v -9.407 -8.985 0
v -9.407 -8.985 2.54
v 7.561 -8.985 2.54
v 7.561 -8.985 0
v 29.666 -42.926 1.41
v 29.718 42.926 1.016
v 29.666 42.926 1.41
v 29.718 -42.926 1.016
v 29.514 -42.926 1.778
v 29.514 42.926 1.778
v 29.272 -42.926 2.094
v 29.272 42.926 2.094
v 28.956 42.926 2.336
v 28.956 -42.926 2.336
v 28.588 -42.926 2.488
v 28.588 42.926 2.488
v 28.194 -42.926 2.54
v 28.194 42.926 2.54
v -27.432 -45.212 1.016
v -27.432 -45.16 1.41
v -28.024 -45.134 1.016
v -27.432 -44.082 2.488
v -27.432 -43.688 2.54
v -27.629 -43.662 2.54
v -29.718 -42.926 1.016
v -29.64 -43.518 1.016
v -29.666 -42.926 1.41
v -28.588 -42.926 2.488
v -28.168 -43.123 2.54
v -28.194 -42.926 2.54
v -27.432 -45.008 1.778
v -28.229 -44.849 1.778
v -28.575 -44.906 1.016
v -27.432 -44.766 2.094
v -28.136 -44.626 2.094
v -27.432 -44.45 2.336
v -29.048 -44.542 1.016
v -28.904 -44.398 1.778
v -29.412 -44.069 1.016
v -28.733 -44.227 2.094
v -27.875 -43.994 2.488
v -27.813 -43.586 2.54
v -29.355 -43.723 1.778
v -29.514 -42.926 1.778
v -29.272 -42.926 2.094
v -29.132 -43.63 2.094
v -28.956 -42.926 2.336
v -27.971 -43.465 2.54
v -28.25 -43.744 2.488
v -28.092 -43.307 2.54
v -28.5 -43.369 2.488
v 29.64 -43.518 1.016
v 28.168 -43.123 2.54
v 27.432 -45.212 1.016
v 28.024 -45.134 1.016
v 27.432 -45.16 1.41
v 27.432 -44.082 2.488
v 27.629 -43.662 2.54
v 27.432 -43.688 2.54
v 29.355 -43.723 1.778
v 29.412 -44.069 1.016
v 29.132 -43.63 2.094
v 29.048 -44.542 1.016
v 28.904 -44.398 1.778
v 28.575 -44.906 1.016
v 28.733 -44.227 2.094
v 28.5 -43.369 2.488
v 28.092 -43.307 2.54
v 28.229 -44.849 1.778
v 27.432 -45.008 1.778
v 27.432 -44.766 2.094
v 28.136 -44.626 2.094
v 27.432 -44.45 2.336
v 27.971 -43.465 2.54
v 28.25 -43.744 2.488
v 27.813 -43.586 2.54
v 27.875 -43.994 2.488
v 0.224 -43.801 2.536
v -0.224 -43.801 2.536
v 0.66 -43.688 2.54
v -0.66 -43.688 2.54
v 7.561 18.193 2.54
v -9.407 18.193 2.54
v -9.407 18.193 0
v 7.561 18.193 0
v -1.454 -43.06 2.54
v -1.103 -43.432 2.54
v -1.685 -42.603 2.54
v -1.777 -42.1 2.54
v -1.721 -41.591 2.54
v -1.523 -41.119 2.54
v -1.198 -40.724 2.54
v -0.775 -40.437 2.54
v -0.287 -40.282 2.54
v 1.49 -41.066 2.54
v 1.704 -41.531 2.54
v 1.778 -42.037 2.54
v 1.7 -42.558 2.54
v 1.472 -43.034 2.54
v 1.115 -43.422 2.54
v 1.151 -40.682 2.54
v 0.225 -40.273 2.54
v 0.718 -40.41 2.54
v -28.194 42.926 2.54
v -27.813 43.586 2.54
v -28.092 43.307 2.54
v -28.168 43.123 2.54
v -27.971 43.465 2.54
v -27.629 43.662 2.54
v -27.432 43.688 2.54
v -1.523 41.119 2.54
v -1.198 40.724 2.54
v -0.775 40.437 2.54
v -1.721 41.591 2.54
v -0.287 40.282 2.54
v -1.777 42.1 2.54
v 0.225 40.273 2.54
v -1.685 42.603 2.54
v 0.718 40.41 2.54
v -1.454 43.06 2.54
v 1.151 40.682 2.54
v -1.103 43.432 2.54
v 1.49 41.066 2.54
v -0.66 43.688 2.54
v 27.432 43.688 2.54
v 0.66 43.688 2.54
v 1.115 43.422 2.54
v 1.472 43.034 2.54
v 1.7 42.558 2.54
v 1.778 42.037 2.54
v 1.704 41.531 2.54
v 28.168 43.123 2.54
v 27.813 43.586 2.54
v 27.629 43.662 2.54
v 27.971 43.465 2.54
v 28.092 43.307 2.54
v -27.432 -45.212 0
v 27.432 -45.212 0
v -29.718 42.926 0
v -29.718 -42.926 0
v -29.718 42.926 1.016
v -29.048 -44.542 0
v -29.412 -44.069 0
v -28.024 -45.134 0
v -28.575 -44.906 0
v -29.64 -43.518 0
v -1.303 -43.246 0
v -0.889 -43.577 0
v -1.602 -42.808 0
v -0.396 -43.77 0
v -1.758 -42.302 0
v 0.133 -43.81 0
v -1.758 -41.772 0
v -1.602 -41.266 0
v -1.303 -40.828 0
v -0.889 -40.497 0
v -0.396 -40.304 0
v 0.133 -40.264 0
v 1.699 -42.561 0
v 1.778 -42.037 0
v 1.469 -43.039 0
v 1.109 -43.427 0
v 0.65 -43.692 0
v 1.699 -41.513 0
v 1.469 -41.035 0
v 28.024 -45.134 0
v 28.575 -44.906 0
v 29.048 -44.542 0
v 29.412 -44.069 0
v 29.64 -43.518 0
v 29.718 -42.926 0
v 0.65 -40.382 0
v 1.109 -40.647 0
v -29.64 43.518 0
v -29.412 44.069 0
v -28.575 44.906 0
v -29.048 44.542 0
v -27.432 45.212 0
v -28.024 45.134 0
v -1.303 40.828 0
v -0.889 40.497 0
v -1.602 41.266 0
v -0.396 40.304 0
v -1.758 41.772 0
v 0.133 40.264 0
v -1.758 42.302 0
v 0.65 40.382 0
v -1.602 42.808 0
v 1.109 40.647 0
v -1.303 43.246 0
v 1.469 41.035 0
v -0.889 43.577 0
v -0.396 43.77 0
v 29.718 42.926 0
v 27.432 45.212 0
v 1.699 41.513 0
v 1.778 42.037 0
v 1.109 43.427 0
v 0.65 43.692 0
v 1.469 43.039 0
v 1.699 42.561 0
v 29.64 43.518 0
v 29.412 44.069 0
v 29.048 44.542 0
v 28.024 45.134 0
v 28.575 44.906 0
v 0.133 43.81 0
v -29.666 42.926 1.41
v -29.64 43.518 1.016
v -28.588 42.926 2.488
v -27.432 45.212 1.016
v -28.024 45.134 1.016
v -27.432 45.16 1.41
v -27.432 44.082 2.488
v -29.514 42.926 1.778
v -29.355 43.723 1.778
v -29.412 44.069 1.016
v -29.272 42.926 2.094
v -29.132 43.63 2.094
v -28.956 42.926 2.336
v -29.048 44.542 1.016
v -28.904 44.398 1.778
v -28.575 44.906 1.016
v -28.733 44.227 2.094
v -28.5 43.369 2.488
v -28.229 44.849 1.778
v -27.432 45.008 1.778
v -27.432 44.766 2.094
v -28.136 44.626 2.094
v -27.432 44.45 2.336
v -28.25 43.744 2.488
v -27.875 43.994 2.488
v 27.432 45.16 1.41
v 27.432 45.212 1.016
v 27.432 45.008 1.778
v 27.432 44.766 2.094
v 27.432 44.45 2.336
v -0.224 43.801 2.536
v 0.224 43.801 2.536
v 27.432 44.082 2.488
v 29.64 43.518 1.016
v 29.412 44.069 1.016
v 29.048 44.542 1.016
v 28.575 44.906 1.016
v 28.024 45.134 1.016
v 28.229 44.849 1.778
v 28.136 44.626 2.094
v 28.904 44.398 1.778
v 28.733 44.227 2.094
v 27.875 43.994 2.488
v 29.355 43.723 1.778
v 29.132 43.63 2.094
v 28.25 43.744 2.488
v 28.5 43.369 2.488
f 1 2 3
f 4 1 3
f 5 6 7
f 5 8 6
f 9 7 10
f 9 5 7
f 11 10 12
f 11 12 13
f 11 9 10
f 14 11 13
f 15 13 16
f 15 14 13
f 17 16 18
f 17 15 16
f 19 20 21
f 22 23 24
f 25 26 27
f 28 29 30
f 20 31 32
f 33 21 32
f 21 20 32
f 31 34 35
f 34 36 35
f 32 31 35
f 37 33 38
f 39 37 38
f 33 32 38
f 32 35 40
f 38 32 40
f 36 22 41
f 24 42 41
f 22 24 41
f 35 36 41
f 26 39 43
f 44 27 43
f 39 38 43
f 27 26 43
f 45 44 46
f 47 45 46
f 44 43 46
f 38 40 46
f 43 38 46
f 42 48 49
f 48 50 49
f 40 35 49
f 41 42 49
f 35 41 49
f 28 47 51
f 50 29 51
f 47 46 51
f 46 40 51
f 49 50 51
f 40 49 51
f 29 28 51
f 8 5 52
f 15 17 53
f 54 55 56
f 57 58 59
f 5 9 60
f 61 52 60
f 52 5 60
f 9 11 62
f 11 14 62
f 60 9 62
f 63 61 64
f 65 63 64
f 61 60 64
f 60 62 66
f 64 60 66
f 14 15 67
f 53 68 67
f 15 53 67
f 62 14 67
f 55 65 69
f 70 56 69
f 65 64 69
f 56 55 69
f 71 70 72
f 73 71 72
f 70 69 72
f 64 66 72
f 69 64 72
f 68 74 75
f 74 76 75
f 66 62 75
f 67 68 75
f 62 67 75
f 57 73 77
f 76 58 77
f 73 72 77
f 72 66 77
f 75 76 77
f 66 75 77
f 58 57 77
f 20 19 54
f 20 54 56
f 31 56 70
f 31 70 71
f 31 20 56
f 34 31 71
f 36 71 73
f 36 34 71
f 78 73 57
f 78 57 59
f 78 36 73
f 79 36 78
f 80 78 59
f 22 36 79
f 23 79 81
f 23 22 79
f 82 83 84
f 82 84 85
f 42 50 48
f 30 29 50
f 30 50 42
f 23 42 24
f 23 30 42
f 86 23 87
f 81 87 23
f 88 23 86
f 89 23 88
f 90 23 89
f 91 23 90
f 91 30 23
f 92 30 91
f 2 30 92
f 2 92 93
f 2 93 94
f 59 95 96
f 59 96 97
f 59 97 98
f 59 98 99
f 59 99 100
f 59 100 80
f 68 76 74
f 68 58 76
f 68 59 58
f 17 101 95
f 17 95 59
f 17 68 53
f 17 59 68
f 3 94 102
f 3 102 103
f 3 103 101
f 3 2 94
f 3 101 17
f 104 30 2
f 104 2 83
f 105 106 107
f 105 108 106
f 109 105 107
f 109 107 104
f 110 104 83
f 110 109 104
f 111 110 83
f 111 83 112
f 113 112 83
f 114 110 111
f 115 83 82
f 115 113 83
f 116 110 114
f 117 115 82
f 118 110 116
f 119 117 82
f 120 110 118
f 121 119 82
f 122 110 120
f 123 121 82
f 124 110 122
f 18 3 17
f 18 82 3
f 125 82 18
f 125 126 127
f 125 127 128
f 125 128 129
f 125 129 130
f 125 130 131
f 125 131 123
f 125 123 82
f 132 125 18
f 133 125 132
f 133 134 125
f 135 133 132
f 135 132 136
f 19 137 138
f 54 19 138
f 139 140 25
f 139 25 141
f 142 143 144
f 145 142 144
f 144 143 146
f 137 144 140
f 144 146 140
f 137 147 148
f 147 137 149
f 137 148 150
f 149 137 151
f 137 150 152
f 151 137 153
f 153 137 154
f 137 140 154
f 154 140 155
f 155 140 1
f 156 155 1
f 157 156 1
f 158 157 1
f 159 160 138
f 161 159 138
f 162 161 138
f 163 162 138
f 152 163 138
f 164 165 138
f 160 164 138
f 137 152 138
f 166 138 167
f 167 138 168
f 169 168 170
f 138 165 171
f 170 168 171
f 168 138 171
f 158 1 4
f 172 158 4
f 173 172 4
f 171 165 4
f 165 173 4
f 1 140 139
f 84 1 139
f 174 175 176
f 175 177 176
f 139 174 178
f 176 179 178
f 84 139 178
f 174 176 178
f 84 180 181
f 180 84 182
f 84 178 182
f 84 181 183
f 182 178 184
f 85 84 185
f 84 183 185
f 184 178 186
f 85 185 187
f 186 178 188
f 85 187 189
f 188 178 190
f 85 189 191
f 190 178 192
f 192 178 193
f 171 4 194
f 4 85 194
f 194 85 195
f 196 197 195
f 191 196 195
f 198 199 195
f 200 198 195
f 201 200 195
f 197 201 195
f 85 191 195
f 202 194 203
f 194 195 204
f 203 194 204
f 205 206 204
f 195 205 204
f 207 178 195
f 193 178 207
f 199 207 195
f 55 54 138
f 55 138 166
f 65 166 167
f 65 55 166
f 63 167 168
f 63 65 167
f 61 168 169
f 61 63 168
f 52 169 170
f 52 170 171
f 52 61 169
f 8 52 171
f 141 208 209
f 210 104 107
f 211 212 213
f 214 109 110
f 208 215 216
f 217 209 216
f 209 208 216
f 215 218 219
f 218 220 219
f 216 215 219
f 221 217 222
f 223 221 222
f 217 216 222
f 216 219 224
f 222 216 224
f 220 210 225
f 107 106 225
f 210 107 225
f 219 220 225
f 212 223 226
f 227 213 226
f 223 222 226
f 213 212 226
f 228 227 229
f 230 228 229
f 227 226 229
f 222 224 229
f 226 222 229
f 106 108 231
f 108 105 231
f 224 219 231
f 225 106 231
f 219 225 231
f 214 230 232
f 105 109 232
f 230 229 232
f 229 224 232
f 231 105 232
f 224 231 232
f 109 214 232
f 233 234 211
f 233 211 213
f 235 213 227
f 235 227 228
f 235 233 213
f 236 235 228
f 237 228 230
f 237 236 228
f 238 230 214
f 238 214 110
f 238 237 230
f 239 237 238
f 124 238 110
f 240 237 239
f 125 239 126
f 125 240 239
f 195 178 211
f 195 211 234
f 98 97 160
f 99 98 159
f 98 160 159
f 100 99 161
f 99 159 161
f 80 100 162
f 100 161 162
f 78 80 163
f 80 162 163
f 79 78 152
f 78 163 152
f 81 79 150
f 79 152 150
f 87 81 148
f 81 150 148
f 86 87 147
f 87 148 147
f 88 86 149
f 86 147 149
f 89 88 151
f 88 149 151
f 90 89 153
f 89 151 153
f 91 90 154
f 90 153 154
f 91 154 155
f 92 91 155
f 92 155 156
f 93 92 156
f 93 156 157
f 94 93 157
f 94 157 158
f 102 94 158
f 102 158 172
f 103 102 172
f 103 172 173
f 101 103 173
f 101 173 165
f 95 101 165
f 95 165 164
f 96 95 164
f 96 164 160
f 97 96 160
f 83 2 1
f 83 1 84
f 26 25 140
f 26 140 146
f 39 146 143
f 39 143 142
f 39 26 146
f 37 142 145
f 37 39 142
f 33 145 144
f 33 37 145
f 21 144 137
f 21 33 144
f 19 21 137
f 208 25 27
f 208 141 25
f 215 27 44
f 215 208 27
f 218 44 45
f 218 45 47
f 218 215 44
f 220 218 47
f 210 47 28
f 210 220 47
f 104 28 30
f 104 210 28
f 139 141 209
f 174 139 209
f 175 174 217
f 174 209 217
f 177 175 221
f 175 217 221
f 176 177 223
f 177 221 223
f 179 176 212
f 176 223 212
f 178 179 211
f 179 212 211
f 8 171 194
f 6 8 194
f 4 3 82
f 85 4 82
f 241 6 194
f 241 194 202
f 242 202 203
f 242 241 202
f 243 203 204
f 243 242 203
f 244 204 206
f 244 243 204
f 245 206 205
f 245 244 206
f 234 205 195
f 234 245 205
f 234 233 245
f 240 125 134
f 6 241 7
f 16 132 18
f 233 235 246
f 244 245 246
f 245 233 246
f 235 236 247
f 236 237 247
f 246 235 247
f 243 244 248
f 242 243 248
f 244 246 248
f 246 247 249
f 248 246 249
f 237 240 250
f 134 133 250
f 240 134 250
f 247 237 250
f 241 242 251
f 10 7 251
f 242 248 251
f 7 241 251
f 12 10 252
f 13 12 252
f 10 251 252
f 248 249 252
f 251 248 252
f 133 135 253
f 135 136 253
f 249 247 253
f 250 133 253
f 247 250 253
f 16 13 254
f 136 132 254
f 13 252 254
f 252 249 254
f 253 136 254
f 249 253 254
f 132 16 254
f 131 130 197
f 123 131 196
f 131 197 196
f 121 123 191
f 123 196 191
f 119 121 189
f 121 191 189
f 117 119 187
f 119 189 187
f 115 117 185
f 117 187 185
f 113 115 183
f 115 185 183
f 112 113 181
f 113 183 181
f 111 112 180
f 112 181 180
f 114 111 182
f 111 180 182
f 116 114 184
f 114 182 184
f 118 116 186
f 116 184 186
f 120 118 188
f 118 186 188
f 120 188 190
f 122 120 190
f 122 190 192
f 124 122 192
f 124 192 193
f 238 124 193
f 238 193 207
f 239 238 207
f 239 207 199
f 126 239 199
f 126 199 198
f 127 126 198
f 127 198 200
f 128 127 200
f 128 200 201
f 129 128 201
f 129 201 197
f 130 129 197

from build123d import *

# Parameters (mm, degrees)
F0_W     = 59.436
F0_H     = 90.424
F1_DEPTH = 2.54
F2_R     = 2.286
F3_R     = 1.524
F4_R     = 1.778
F5_DEPTH = 25.4
F6_W     = 16.9672
F6_H     = 27.178
F7_DEPTH = 25.4


with BuildPart() as f1:
    # F0 (on Top) → F1 (new body)
    with BuildSketch(Plane.XY):
        Rectangle(F0_W, F0_H)
    extrude(amount=F1_DEPTH)

    # F2
    f2_edges = [f1.edges().sort_by_distance(p)[0] for p in [
        (29.718, -45.212, 1.27),
        (-29.718, -45.212, 1.27),
        (29.718, 45.212, 1.27),
        (-29.718, 45.212, 1.27),
    ]]
    fillet(f2_edges, radius=F2_R)

    # F3
    f3_edges = [f1.edges().sort_by_distance(p)[0] for p in [
        (-29.718, 0, 2.54),
    ]]
    fillet(f3_edges, radius=F3_R)

    # F4 (on face) → F5 (cut)
    with BuildSketch(Plane(origin=(0, 0, 0), x_dir=(1, 0, 0), z_dir=(0, 0, -1))):
        with Locations((0, 42.037)):
            Circle(F4_R)
        with Locations((0, -42.037)):
            Circle(F4_R)
    extrude(amount=-F5_DEPTH, mode=Mode.SUBTRACT)

    # F6 (on face) → F7 (cut)
    with BuildSketch(Plane.XY.offset(2.54)):
        with Locations((-0.922986, 4.603704)):
            Rectangle(F6_W, F6_H)
    extrude(amount=-F7_DEPTH, mode=Mode.SUBTRACT)


solid = f1.part
